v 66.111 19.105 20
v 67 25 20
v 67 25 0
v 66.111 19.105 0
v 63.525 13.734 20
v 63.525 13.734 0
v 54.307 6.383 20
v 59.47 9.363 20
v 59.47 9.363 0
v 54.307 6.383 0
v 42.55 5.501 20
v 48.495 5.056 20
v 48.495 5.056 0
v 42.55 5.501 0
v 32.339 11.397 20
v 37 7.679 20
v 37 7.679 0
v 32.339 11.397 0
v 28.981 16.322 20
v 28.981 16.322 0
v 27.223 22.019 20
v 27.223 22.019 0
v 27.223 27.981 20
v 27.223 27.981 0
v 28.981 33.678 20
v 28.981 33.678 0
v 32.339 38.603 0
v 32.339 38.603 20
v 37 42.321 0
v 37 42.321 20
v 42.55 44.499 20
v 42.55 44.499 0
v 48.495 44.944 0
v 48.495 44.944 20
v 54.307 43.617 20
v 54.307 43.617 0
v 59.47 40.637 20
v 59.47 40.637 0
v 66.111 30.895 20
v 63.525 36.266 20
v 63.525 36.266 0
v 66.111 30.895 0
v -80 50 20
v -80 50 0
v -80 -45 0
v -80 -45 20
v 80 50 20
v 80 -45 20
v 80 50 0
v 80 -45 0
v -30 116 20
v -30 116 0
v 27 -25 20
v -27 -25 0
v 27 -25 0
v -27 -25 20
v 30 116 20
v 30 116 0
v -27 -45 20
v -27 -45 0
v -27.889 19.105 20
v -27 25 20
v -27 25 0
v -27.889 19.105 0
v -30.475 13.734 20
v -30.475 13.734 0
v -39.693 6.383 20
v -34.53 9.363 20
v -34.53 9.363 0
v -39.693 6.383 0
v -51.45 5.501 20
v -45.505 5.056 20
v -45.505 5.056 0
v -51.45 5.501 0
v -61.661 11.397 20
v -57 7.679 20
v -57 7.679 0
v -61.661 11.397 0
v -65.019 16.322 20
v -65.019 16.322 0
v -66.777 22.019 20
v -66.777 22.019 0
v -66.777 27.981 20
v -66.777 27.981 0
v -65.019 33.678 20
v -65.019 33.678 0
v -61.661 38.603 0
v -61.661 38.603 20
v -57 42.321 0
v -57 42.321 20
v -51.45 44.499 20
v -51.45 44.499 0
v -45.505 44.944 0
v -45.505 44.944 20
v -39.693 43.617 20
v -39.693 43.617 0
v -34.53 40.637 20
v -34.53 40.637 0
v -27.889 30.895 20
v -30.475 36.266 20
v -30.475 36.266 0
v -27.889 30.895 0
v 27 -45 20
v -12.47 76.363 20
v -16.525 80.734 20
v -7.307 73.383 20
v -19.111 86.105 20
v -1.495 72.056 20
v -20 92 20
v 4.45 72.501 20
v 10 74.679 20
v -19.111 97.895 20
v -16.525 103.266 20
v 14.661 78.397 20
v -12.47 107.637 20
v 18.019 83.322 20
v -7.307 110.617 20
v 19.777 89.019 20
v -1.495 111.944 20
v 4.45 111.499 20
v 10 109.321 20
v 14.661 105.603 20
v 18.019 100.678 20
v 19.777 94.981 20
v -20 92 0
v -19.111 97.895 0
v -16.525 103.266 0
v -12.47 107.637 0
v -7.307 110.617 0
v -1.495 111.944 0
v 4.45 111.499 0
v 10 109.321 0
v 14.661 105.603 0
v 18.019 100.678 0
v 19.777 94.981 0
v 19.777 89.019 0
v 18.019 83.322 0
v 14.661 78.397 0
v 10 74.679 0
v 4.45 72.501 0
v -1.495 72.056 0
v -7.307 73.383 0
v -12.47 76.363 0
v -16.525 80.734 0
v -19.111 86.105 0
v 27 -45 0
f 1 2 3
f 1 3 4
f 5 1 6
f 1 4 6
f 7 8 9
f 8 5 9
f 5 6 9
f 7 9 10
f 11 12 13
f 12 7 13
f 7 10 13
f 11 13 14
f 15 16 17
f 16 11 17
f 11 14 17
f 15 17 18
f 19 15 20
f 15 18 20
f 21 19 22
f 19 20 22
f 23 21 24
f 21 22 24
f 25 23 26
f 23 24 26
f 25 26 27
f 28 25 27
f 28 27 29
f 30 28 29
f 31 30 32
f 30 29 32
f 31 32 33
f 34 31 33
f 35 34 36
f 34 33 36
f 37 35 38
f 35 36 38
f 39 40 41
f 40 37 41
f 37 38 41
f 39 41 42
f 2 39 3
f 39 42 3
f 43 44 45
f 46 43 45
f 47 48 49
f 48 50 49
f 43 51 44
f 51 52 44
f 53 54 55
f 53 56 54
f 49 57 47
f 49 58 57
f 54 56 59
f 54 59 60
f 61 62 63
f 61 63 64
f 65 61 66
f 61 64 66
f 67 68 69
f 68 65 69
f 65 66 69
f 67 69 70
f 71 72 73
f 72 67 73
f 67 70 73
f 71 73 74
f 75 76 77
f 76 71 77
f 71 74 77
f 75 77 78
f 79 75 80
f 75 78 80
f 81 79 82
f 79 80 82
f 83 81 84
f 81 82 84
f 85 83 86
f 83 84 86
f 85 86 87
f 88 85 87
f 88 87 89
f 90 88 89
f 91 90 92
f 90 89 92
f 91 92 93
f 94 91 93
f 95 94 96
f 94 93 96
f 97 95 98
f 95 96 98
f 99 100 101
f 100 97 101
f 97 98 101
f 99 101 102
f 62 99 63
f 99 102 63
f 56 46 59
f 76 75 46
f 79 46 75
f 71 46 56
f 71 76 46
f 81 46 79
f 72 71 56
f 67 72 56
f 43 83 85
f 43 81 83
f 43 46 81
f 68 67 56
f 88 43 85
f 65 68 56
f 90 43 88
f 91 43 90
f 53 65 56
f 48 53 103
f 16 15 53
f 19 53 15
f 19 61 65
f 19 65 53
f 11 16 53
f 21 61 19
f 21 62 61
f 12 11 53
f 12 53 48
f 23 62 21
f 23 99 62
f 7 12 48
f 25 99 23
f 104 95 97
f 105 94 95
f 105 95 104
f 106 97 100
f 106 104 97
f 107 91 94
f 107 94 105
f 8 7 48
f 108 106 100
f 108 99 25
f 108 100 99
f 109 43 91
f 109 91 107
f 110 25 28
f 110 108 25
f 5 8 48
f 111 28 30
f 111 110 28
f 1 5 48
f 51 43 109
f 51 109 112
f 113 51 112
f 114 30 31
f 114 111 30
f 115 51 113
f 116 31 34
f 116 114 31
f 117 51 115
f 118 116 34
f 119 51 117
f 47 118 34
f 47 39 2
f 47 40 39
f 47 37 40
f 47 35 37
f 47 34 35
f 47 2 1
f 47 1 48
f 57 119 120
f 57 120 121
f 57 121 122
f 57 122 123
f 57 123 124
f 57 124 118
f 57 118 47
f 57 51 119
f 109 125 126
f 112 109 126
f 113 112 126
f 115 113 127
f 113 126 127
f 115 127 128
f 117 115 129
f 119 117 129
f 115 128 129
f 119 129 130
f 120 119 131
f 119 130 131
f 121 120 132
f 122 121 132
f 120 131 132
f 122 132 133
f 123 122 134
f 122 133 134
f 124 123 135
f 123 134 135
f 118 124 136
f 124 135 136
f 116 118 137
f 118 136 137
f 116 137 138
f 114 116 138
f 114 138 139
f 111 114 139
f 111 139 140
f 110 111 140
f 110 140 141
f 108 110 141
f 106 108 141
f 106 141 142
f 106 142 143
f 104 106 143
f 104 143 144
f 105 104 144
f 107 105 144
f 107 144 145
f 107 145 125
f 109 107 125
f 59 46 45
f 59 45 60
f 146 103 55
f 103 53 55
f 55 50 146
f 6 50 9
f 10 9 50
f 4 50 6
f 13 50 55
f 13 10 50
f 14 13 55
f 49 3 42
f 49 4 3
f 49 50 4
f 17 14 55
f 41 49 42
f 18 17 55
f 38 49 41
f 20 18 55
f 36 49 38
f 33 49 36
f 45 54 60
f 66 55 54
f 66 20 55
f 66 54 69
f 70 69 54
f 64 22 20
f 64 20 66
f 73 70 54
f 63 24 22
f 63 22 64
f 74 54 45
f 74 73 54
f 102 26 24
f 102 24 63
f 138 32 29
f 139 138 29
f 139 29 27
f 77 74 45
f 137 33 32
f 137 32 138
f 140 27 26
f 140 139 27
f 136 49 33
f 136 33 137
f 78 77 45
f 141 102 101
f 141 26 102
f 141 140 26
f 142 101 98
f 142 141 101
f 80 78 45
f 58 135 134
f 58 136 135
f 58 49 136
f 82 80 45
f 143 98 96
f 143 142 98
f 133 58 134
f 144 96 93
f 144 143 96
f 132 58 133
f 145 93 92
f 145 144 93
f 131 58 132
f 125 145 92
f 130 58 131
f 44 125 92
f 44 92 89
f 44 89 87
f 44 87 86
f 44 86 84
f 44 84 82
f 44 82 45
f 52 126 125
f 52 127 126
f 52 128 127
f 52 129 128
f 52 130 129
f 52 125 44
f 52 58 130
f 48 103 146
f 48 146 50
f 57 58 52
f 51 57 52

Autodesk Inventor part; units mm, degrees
ref_plane "YZ Plane" through (0, 0, 0) normal (1, 0, 0) x (0, 1, 0)
ref_plane "XZ Plane" through (0, 0, 0) normal (0, 1, 0) x (-1, 0, 0)
ref_plane "XY Plane" through (0, 0, 0) normal (0, 0, 1) x (1, 0, 0)
sketch "Sketch1" plane through (0, 0, 0) normal (0, 0, 1) x (1, 0, 0)
  line L0 (-80, 0) -> (80, 0)
  line L1 (80, 0) -> (80, 50)
  line L2 (-80, 50) -> (-80, 0)
  line L3 (0, 116) -> (30, 116)
  line L4 (30, 116) -> (-30, 116)
  line L5 (-30, 116) -> (-80, 50)
  line L6 (30, 116) -> (80, 50)
  circle A0 centre (0, 92) radius 8
  circle A1 centre (0, 92) radius 12
  line L7 (80, 0) -> (80, -15)
  line L8 (80, -15) -> (55, -15)
  line L9 (55, -15) -> (55, 0)
  line L10 (-80, 0) -> (-80, -15)
  line L11 (-80, -15) -> (-55, -15)
  line L12 (-55, -15) -> (-55, 0)
  circle A2 centre (47, 25) radius 20
  circle A3 centre (-47, 25) radius 20
  circle A4 centre (0, 92) radius 20
  point P0 (0, 0)
  dimension "d0" = 160
  dimension "d1" = 50
  dimension "d3" = 60
  dimension "d4" = 16
  dimension "d5" = 24
  dimension "d6" = 15
  dimension "d7" = 25
  dimension "d12" = 40
  dimension "d13" = 40
  dimension "d21" = 40
extrude "Extrusion1" add sketch "Sketch1" along normal blind 20 contours L2 L5 L4 L3 L6 L1 L0 | L0 L12 L11 L10 | L0 L7 L8 L9 | A1 | A4
sketch "Sketch5" plane through (0, 0, 0) normal (0, 0, -1) x (-1, 0, 0)
  circle A0 centre (0, 92) radius 8 projected
  circle A1 centre (0, 92) radius 20
  point P0 (0, 0)
  dimension "d22" = 40
extrude "Extrusion4" cut sketch "Sketch5" against normal blind 20
sketch "Sketch6" plane through (-55, 0, 0) normal (0, -1, 0) x (1, 0, 0)
  point P0 (55, 0)
sketch "Sketch7" plane through (-55, 0, 0) normal (0, -1, 0) x (1, 0, 0)
  line L0 (-25, 0) -> (-25, 20) projected
  line L1 (-12, 0) -> (28, 0) projected
  line L2 (-25, 20) -> (28, 20)
  line L3 (28, 20) -> (28, 0)
  line L4 (28, 0) -> (-25, 0)
  line L5 (-25, 0) -> (-25, 20)
  line L6 (135, 0) -> (135, 20) projected
  line L7 (135, 20) -> (82, 20)
  line L8 (82, 20) -> (82, 0)
  line L9 (82, 0) -> (135, 0)
  line L10 (135, 0) -> (135, 20)
  point P0 (55, 0)
  dimension "d25" = 53
extrude "Extrusion5" add sketch "Sketch7" along normal blind 45
sketch "Sketch8" plane through (-27, 0, 0) normal (0, -1, 0) x (1, 0, 0)
  line L0 (-40, 20) -> (0, 20) projected
  line L1 (57, 0) -> (-3, 0) projected
  line L2 (0, 20) -> (54, 20)
  line L3 (54, 20) -> (54, 0)
  line L4 (54, 0) -> (0, 0)
  line L5 (0, 0) -> (0, 20)
  point P0 (27, 0)
extrude "Extrusion6" add sketch "Sketch8" along normal blind 25
properties part number "Project_support_stand"
